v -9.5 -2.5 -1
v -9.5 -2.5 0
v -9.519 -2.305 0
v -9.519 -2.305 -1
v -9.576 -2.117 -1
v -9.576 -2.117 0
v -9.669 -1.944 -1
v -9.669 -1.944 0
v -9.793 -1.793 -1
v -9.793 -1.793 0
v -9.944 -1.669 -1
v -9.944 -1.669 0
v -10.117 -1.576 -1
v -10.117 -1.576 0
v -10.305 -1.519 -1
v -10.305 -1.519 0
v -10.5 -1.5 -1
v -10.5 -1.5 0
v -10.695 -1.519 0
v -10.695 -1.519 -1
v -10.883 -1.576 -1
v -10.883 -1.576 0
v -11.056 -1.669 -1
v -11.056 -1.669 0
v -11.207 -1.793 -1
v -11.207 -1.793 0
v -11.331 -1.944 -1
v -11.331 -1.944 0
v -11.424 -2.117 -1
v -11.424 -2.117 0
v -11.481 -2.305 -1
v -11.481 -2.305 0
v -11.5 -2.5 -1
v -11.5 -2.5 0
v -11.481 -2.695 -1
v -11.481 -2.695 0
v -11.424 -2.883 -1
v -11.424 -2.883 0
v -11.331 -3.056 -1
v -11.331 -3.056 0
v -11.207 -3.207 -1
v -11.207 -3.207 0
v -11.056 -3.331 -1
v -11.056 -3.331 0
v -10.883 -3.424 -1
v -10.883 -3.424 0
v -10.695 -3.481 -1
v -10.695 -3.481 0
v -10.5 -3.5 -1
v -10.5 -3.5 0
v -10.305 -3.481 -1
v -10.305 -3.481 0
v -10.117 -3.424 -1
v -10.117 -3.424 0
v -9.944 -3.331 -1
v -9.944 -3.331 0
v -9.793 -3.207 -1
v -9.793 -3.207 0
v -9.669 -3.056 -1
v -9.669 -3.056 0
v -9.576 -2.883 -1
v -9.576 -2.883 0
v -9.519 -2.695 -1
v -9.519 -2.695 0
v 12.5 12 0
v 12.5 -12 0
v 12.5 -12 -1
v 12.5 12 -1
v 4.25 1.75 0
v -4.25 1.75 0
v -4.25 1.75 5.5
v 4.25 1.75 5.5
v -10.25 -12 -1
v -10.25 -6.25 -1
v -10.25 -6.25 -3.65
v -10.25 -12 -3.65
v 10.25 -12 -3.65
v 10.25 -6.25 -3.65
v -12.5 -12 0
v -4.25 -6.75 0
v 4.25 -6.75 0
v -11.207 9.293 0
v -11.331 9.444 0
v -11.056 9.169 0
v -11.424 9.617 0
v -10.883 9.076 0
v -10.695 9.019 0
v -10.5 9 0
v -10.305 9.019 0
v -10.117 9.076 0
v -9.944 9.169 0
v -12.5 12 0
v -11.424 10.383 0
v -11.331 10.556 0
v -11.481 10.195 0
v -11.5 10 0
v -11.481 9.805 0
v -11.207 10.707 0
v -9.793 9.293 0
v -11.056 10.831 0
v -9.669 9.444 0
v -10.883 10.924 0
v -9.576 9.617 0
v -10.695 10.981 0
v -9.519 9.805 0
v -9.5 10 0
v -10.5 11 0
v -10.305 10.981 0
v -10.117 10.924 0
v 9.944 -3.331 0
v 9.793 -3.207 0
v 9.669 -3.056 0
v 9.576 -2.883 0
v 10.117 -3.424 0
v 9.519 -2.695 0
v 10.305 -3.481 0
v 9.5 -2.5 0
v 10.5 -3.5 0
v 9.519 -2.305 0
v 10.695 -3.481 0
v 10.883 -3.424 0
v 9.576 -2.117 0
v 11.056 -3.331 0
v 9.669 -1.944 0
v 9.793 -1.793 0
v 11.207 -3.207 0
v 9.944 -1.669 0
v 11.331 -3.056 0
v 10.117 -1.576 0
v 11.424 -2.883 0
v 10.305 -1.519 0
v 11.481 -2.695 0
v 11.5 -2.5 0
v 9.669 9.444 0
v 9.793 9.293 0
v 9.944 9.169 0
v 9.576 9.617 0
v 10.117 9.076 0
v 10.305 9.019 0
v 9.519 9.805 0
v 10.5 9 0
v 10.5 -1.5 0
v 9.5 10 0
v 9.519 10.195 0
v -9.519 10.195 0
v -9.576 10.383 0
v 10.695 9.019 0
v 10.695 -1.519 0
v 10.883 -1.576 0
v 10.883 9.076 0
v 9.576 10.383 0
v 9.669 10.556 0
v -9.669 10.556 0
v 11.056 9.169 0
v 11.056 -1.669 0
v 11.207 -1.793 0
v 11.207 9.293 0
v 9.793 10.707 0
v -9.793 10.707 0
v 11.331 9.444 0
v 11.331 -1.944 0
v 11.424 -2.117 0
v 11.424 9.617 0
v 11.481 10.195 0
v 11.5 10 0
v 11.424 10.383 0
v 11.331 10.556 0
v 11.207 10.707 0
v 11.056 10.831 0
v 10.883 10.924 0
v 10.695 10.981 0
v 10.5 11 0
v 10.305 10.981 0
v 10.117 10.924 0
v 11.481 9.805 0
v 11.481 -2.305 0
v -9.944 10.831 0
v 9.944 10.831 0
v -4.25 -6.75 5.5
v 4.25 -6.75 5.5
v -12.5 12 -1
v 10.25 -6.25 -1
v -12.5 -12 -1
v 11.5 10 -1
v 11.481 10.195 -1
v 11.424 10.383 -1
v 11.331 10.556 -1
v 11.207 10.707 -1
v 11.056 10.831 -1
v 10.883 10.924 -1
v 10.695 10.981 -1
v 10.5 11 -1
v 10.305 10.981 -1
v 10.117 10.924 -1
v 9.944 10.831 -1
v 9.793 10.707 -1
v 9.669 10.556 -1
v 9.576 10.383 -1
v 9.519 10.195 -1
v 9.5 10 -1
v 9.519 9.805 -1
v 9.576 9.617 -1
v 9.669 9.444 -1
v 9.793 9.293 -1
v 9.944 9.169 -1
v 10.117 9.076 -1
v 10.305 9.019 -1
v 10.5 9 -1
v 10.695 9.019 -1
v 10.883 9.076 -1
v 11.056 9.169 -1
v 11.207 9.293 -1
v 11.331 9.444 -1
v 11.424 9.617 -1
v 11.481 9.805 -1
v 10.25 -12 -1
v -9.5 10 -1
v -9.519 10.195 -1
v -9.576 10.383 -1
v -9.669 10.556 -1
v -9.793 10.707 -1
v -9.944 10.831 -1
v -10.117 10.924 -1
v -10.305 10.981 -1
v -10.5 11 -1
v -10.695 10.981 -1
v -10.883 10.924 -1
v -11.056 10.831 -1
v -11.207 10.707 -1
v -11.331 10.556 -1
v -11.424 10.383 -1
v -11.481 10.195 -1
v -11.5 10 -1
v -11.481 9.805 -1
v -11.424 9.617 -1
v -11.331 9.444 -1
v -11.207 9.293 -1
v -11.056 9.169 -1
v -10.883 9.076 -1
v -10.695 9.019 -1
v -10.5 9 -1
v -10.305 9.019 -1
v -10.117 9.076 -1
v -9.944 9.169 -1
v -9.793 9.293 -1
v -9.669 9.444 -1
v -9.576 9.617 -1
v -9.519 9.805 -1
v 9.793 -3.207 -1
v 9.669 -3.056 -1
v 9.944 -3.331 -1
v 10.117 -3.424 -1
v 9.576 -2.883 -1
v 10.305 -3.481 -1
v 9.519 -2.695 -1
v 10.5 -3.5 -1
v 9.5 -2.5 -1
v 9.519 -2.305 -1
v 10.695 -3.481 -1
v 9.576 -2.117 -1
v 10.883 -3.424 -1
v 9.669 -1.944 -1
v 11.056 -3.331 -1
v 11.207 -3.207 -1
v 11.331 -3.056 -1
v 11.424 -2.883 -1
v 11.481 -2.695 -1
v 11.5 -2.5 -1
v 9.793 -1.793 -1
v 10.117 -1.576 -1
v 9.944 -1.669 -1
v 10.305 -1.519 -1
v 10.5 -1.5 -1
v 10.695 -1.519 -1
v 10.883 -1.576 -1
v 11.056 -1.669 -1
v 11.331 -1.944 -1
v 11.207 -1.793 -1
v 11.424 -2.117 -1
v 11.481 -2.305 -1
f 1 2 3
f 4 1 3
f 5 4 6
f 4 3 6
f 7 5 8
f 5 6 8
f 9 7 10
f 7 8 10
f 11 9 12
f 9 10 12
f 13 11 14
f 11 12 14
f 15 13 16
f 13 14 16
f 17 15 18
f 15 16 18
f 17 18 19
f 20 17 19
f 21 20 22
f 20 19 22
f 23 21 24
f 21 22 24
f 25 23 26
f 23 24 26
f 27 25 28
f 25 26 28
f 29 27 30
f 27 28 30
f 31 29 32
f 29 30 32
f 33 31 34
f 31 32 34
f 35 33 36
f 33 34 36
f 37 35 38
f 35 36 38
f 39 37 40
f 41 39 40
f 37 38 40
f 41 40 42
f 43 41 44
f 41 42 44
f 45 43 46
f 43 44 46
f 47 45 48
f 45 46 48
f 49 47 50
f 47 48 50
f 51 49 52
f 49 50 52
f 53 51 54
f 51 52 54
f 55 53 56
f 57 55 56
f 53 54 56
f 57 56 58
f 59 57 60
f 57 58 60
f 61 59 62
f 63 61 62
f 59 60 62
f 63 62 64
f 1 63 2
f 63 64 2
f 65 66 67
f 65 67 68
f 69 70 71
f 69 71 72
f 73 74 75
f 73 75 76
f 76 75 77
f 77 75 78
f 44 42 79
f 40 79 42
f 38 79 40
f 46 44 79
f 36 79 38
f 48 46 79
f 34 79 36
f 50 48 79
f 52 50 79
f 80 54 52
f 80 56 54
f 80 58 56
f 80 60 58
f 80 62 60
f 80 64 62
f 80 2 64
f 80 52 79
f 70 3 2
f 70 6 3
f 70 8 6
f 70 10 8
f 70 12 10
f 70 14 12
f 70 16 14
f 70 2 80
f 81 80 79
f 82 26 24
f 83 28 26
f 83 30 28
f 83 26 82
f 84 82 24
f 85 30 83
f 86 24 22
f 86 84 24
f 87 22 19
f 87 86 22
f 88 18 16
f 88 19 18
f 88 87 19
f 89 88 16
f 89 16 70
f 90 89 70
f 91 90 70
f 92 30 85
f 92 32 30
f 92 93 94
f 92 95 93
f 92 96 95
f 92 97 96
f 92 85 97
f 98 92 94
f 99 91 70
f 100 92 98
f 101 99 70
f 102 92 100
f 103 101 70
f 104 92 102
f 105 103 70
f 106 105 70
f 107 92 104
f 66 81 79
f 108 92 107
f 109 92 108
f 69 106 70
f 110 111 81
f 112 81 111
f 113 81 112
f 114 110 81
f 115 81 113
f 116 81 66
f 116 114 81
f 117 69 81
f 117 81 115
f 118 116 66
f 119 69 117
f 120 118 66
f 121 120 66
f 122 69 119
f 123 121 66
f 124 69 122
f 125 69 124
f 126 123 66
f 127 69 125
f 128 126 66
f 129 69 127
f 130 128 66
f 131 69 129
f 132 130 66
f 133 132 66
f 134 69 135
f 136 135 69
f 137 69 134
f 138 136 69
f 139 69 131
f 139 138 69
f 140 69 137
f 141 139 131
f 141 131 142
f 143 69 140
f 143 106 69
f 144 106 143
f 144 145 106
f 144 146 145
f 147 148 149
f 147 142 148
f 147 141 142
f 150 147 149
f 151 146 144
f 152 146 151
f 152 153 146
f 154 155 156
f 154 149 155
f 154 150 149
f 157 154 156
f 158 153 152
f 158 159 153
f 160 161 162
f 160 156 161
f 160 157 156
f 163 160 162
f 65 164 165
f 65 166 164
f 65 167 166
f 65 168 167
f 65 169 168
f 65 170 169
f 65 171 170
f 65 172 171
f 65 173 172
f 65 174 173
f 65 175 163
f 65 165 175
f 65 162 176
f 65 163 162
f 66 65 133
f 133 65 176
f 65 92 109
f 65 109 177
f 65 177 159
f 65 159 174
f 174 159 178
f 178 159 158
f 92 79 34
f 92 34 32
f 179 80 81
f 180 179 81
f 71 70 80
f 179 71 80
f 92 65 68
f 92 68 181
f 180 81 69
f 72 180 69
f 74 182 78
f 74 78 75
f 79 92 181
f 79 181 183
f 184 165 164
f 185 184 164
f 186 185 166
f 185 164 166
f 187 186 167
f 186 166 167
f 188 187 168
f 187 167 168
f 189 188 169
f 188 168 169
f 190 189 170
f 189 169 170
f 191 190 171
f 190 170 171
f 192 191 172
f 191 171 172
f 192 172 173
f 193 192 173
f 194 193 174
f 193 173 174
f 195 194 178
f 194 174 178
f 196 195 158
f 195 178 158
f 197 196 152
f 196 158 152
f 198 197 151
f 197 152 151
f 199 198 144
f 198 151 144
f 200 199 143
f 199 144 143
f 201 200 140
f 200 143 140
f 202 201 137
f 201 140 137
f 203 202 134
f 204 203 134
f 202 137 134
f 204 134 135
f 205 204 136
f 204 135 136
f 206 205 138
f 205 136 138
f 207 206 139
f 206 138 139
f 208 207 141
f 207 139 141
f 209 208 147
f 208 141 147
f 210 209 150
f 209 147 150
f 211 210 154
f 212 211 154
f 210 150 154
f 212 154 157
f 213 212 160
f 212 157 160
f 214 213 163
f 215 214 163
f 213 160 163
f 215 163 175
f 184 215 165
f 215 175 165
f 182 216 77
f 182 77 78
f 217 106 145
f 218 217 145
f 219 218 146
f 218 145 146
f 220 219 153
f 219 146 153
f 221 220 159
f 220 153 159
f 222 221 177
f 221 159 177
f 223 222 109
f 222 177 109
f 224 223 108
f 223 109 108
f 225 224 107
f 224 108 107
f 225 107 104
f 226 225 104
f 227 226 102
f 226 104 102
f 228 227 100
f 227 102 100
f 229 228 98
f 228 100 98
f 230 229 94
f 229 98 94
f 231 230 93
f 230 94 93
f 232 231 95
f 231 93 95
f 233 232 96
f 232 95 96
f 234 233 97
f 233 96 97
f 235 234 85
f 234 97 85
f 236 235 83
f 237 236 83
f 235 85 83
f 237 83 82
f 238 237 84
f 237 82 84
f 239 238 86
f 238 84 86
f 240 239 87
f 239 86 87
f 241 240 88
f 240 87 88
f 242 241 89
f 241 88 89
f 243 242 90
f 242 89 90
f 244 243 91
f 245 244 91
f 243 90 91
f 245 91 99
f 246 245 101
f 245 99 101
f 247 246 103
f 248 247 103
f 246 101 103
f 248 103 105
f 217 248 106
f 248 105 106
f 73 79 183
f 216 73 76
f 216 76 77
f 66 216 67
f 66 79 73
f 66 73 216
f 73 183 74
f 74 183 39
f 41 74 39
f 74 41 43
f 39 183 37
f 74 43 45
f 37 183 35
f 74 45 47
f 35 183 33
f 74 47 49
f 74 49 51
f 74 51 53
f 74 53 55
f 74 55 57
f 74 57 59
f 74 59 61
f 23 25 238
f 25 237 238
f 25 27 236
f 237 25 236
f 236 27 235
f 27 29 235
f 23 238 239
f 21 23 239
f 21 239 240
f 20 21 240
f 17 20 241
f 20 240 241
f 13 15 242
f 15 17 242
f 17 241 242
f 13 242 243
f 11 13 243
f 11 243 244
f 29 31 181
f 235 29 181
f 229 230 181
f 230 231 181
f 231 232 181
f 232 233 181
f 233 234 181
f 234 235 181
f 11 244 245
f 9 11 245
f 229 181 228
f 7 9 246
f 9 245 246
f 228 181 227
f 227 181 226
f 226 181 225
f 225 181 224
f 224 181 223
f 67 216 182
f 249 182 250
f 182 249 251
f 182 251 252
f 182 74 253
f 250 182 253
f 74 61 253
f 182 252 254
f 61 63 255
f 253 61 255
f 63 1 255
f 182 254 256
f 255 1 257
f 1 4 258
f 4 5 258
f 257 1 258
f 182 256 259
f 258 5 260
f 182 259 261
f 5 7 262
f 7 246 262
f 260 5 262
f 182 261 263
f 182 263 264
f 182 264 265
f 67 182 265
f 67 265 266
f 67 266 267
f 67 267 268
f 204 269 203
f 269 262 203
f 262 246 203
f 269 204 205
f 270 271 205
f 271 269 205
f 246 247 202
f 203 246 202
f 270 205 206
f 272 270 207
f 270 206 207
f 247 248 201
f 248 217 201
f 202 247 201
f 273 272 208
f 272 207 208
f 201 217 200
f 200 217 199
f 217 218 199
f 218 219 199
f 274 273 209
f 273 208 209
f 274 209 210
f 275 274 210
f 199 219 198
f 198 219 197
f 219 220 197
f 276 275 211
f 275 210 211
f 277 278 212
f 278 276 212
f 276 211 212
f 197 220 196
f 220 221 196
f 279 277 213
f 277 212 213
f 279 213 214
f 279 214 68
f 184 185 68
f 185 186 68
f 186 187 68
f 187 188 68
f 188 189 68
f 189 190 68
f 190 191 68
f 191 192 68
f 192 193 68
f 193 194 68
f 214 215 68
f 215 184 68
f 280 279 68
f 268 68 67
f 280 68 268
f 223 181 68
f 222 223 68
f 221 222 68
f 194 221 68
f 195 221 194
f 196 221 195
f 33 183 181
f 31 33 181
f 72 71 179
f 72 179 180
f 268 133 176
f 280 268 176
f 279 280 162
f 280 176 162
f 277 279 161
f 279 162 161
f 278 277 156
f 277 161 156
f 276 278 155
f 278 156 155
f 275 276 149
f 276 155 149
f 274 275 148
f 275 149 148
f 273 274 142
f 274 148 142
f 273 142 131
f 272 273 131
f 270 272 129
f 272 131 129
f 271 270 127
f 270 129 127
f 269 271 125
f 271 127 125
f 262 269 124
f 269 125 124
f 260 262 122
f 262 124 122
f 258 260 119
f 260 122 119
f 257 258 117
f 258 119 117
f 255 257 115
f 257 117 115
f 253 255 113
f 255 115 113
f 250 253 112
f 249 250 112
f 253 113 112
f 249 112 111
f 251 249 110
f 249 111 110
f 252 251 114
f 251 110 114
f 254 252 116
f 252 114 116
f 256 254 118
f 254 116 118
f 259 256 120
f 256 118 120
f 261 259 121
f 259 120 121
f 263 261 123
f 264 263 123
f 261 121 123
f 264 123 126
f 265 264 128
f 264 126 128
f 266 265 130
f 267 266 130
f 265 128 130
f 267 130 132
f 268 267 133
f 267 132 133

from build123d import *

# Parameters (mm, degrees)
F0_R     = 1
F0_W     = 8.5
F0_H     = 8
F0_H_2   = 0.5
F1_DEPTH = 1
F2_DEPTH = 3.65
F3_DEPTH = 5.5


with BuildPart() as f1:
    # F0 (on Top) → F1 (new body)
    with BuildSketch(Plane.XY):
        Polygon((12.5, -12), (12.5, 12), (-12.5, 12), (-12.5, -12), (-10.25, -12), (-10.25, -6.25), (-4.25, -6.25), (-4.25, 1.75), (4.25, 1.75), (4.25, -6.25), (10.25, -6.25), (10.25, -12), align=None)
        with Locations((-10.5, -2.5)):
            Circle(F0_R, mode=Mode.SUBTRACT)
        with Locations((10.5, -2.5)):
            Circle(F0_R, mode=Mode.SUBTRACT)
        with Locations((-10.5, 10)):
            Circle(F0_R, mode=Mode.SUBTRACT)
        with Locations((10.5, 10)):
            Circle(F0_R, mode=Mode.SUBTRACT)
        Polygon((-10.25, -12), (10.25, -12), (10.25, -6.25), (4.25, -6.25), (4.25, -6.75), (-4.25, -6.75), (-4.25, -6.25), (-10.25, -6.25), align=None)
        with Locations((0, -2.25)):
            Rectangle(F0_W, F0_H)
        with Locations((0, -6.5)):
            Rectangle(F0_W, F0_H_2)
    extrude(amount=-F1_DEPTH)

    # F0 (on Top) → F2 (join)
    with BuildSketch(Plane.XY):
        Polygon((-10.25, -12), (10.25, -12), (10.25, -6.25), (4.25, -6.25), (4.25, -6.75), (-4.25, -6.75), (-4.25, -6.25), (-10.25, -6.25), align=None)
        with Locations((0, -6.5)):
            Rectangle(F0_W, F0_H_2)
    extrude(amount=-F2_DEPTH)

    # F0 (on Top) → F3 (join)
    with BuildSketch(Plane.XY):
        with Locations((0, -2.25)):
            Rectangle(F0_W, F0_H)
        with Locations((0, -6.5)):
            Rectangle(F0_W, F0_H_2)
    extrude(amount=F3_DEPTH)


solid = f1.part
